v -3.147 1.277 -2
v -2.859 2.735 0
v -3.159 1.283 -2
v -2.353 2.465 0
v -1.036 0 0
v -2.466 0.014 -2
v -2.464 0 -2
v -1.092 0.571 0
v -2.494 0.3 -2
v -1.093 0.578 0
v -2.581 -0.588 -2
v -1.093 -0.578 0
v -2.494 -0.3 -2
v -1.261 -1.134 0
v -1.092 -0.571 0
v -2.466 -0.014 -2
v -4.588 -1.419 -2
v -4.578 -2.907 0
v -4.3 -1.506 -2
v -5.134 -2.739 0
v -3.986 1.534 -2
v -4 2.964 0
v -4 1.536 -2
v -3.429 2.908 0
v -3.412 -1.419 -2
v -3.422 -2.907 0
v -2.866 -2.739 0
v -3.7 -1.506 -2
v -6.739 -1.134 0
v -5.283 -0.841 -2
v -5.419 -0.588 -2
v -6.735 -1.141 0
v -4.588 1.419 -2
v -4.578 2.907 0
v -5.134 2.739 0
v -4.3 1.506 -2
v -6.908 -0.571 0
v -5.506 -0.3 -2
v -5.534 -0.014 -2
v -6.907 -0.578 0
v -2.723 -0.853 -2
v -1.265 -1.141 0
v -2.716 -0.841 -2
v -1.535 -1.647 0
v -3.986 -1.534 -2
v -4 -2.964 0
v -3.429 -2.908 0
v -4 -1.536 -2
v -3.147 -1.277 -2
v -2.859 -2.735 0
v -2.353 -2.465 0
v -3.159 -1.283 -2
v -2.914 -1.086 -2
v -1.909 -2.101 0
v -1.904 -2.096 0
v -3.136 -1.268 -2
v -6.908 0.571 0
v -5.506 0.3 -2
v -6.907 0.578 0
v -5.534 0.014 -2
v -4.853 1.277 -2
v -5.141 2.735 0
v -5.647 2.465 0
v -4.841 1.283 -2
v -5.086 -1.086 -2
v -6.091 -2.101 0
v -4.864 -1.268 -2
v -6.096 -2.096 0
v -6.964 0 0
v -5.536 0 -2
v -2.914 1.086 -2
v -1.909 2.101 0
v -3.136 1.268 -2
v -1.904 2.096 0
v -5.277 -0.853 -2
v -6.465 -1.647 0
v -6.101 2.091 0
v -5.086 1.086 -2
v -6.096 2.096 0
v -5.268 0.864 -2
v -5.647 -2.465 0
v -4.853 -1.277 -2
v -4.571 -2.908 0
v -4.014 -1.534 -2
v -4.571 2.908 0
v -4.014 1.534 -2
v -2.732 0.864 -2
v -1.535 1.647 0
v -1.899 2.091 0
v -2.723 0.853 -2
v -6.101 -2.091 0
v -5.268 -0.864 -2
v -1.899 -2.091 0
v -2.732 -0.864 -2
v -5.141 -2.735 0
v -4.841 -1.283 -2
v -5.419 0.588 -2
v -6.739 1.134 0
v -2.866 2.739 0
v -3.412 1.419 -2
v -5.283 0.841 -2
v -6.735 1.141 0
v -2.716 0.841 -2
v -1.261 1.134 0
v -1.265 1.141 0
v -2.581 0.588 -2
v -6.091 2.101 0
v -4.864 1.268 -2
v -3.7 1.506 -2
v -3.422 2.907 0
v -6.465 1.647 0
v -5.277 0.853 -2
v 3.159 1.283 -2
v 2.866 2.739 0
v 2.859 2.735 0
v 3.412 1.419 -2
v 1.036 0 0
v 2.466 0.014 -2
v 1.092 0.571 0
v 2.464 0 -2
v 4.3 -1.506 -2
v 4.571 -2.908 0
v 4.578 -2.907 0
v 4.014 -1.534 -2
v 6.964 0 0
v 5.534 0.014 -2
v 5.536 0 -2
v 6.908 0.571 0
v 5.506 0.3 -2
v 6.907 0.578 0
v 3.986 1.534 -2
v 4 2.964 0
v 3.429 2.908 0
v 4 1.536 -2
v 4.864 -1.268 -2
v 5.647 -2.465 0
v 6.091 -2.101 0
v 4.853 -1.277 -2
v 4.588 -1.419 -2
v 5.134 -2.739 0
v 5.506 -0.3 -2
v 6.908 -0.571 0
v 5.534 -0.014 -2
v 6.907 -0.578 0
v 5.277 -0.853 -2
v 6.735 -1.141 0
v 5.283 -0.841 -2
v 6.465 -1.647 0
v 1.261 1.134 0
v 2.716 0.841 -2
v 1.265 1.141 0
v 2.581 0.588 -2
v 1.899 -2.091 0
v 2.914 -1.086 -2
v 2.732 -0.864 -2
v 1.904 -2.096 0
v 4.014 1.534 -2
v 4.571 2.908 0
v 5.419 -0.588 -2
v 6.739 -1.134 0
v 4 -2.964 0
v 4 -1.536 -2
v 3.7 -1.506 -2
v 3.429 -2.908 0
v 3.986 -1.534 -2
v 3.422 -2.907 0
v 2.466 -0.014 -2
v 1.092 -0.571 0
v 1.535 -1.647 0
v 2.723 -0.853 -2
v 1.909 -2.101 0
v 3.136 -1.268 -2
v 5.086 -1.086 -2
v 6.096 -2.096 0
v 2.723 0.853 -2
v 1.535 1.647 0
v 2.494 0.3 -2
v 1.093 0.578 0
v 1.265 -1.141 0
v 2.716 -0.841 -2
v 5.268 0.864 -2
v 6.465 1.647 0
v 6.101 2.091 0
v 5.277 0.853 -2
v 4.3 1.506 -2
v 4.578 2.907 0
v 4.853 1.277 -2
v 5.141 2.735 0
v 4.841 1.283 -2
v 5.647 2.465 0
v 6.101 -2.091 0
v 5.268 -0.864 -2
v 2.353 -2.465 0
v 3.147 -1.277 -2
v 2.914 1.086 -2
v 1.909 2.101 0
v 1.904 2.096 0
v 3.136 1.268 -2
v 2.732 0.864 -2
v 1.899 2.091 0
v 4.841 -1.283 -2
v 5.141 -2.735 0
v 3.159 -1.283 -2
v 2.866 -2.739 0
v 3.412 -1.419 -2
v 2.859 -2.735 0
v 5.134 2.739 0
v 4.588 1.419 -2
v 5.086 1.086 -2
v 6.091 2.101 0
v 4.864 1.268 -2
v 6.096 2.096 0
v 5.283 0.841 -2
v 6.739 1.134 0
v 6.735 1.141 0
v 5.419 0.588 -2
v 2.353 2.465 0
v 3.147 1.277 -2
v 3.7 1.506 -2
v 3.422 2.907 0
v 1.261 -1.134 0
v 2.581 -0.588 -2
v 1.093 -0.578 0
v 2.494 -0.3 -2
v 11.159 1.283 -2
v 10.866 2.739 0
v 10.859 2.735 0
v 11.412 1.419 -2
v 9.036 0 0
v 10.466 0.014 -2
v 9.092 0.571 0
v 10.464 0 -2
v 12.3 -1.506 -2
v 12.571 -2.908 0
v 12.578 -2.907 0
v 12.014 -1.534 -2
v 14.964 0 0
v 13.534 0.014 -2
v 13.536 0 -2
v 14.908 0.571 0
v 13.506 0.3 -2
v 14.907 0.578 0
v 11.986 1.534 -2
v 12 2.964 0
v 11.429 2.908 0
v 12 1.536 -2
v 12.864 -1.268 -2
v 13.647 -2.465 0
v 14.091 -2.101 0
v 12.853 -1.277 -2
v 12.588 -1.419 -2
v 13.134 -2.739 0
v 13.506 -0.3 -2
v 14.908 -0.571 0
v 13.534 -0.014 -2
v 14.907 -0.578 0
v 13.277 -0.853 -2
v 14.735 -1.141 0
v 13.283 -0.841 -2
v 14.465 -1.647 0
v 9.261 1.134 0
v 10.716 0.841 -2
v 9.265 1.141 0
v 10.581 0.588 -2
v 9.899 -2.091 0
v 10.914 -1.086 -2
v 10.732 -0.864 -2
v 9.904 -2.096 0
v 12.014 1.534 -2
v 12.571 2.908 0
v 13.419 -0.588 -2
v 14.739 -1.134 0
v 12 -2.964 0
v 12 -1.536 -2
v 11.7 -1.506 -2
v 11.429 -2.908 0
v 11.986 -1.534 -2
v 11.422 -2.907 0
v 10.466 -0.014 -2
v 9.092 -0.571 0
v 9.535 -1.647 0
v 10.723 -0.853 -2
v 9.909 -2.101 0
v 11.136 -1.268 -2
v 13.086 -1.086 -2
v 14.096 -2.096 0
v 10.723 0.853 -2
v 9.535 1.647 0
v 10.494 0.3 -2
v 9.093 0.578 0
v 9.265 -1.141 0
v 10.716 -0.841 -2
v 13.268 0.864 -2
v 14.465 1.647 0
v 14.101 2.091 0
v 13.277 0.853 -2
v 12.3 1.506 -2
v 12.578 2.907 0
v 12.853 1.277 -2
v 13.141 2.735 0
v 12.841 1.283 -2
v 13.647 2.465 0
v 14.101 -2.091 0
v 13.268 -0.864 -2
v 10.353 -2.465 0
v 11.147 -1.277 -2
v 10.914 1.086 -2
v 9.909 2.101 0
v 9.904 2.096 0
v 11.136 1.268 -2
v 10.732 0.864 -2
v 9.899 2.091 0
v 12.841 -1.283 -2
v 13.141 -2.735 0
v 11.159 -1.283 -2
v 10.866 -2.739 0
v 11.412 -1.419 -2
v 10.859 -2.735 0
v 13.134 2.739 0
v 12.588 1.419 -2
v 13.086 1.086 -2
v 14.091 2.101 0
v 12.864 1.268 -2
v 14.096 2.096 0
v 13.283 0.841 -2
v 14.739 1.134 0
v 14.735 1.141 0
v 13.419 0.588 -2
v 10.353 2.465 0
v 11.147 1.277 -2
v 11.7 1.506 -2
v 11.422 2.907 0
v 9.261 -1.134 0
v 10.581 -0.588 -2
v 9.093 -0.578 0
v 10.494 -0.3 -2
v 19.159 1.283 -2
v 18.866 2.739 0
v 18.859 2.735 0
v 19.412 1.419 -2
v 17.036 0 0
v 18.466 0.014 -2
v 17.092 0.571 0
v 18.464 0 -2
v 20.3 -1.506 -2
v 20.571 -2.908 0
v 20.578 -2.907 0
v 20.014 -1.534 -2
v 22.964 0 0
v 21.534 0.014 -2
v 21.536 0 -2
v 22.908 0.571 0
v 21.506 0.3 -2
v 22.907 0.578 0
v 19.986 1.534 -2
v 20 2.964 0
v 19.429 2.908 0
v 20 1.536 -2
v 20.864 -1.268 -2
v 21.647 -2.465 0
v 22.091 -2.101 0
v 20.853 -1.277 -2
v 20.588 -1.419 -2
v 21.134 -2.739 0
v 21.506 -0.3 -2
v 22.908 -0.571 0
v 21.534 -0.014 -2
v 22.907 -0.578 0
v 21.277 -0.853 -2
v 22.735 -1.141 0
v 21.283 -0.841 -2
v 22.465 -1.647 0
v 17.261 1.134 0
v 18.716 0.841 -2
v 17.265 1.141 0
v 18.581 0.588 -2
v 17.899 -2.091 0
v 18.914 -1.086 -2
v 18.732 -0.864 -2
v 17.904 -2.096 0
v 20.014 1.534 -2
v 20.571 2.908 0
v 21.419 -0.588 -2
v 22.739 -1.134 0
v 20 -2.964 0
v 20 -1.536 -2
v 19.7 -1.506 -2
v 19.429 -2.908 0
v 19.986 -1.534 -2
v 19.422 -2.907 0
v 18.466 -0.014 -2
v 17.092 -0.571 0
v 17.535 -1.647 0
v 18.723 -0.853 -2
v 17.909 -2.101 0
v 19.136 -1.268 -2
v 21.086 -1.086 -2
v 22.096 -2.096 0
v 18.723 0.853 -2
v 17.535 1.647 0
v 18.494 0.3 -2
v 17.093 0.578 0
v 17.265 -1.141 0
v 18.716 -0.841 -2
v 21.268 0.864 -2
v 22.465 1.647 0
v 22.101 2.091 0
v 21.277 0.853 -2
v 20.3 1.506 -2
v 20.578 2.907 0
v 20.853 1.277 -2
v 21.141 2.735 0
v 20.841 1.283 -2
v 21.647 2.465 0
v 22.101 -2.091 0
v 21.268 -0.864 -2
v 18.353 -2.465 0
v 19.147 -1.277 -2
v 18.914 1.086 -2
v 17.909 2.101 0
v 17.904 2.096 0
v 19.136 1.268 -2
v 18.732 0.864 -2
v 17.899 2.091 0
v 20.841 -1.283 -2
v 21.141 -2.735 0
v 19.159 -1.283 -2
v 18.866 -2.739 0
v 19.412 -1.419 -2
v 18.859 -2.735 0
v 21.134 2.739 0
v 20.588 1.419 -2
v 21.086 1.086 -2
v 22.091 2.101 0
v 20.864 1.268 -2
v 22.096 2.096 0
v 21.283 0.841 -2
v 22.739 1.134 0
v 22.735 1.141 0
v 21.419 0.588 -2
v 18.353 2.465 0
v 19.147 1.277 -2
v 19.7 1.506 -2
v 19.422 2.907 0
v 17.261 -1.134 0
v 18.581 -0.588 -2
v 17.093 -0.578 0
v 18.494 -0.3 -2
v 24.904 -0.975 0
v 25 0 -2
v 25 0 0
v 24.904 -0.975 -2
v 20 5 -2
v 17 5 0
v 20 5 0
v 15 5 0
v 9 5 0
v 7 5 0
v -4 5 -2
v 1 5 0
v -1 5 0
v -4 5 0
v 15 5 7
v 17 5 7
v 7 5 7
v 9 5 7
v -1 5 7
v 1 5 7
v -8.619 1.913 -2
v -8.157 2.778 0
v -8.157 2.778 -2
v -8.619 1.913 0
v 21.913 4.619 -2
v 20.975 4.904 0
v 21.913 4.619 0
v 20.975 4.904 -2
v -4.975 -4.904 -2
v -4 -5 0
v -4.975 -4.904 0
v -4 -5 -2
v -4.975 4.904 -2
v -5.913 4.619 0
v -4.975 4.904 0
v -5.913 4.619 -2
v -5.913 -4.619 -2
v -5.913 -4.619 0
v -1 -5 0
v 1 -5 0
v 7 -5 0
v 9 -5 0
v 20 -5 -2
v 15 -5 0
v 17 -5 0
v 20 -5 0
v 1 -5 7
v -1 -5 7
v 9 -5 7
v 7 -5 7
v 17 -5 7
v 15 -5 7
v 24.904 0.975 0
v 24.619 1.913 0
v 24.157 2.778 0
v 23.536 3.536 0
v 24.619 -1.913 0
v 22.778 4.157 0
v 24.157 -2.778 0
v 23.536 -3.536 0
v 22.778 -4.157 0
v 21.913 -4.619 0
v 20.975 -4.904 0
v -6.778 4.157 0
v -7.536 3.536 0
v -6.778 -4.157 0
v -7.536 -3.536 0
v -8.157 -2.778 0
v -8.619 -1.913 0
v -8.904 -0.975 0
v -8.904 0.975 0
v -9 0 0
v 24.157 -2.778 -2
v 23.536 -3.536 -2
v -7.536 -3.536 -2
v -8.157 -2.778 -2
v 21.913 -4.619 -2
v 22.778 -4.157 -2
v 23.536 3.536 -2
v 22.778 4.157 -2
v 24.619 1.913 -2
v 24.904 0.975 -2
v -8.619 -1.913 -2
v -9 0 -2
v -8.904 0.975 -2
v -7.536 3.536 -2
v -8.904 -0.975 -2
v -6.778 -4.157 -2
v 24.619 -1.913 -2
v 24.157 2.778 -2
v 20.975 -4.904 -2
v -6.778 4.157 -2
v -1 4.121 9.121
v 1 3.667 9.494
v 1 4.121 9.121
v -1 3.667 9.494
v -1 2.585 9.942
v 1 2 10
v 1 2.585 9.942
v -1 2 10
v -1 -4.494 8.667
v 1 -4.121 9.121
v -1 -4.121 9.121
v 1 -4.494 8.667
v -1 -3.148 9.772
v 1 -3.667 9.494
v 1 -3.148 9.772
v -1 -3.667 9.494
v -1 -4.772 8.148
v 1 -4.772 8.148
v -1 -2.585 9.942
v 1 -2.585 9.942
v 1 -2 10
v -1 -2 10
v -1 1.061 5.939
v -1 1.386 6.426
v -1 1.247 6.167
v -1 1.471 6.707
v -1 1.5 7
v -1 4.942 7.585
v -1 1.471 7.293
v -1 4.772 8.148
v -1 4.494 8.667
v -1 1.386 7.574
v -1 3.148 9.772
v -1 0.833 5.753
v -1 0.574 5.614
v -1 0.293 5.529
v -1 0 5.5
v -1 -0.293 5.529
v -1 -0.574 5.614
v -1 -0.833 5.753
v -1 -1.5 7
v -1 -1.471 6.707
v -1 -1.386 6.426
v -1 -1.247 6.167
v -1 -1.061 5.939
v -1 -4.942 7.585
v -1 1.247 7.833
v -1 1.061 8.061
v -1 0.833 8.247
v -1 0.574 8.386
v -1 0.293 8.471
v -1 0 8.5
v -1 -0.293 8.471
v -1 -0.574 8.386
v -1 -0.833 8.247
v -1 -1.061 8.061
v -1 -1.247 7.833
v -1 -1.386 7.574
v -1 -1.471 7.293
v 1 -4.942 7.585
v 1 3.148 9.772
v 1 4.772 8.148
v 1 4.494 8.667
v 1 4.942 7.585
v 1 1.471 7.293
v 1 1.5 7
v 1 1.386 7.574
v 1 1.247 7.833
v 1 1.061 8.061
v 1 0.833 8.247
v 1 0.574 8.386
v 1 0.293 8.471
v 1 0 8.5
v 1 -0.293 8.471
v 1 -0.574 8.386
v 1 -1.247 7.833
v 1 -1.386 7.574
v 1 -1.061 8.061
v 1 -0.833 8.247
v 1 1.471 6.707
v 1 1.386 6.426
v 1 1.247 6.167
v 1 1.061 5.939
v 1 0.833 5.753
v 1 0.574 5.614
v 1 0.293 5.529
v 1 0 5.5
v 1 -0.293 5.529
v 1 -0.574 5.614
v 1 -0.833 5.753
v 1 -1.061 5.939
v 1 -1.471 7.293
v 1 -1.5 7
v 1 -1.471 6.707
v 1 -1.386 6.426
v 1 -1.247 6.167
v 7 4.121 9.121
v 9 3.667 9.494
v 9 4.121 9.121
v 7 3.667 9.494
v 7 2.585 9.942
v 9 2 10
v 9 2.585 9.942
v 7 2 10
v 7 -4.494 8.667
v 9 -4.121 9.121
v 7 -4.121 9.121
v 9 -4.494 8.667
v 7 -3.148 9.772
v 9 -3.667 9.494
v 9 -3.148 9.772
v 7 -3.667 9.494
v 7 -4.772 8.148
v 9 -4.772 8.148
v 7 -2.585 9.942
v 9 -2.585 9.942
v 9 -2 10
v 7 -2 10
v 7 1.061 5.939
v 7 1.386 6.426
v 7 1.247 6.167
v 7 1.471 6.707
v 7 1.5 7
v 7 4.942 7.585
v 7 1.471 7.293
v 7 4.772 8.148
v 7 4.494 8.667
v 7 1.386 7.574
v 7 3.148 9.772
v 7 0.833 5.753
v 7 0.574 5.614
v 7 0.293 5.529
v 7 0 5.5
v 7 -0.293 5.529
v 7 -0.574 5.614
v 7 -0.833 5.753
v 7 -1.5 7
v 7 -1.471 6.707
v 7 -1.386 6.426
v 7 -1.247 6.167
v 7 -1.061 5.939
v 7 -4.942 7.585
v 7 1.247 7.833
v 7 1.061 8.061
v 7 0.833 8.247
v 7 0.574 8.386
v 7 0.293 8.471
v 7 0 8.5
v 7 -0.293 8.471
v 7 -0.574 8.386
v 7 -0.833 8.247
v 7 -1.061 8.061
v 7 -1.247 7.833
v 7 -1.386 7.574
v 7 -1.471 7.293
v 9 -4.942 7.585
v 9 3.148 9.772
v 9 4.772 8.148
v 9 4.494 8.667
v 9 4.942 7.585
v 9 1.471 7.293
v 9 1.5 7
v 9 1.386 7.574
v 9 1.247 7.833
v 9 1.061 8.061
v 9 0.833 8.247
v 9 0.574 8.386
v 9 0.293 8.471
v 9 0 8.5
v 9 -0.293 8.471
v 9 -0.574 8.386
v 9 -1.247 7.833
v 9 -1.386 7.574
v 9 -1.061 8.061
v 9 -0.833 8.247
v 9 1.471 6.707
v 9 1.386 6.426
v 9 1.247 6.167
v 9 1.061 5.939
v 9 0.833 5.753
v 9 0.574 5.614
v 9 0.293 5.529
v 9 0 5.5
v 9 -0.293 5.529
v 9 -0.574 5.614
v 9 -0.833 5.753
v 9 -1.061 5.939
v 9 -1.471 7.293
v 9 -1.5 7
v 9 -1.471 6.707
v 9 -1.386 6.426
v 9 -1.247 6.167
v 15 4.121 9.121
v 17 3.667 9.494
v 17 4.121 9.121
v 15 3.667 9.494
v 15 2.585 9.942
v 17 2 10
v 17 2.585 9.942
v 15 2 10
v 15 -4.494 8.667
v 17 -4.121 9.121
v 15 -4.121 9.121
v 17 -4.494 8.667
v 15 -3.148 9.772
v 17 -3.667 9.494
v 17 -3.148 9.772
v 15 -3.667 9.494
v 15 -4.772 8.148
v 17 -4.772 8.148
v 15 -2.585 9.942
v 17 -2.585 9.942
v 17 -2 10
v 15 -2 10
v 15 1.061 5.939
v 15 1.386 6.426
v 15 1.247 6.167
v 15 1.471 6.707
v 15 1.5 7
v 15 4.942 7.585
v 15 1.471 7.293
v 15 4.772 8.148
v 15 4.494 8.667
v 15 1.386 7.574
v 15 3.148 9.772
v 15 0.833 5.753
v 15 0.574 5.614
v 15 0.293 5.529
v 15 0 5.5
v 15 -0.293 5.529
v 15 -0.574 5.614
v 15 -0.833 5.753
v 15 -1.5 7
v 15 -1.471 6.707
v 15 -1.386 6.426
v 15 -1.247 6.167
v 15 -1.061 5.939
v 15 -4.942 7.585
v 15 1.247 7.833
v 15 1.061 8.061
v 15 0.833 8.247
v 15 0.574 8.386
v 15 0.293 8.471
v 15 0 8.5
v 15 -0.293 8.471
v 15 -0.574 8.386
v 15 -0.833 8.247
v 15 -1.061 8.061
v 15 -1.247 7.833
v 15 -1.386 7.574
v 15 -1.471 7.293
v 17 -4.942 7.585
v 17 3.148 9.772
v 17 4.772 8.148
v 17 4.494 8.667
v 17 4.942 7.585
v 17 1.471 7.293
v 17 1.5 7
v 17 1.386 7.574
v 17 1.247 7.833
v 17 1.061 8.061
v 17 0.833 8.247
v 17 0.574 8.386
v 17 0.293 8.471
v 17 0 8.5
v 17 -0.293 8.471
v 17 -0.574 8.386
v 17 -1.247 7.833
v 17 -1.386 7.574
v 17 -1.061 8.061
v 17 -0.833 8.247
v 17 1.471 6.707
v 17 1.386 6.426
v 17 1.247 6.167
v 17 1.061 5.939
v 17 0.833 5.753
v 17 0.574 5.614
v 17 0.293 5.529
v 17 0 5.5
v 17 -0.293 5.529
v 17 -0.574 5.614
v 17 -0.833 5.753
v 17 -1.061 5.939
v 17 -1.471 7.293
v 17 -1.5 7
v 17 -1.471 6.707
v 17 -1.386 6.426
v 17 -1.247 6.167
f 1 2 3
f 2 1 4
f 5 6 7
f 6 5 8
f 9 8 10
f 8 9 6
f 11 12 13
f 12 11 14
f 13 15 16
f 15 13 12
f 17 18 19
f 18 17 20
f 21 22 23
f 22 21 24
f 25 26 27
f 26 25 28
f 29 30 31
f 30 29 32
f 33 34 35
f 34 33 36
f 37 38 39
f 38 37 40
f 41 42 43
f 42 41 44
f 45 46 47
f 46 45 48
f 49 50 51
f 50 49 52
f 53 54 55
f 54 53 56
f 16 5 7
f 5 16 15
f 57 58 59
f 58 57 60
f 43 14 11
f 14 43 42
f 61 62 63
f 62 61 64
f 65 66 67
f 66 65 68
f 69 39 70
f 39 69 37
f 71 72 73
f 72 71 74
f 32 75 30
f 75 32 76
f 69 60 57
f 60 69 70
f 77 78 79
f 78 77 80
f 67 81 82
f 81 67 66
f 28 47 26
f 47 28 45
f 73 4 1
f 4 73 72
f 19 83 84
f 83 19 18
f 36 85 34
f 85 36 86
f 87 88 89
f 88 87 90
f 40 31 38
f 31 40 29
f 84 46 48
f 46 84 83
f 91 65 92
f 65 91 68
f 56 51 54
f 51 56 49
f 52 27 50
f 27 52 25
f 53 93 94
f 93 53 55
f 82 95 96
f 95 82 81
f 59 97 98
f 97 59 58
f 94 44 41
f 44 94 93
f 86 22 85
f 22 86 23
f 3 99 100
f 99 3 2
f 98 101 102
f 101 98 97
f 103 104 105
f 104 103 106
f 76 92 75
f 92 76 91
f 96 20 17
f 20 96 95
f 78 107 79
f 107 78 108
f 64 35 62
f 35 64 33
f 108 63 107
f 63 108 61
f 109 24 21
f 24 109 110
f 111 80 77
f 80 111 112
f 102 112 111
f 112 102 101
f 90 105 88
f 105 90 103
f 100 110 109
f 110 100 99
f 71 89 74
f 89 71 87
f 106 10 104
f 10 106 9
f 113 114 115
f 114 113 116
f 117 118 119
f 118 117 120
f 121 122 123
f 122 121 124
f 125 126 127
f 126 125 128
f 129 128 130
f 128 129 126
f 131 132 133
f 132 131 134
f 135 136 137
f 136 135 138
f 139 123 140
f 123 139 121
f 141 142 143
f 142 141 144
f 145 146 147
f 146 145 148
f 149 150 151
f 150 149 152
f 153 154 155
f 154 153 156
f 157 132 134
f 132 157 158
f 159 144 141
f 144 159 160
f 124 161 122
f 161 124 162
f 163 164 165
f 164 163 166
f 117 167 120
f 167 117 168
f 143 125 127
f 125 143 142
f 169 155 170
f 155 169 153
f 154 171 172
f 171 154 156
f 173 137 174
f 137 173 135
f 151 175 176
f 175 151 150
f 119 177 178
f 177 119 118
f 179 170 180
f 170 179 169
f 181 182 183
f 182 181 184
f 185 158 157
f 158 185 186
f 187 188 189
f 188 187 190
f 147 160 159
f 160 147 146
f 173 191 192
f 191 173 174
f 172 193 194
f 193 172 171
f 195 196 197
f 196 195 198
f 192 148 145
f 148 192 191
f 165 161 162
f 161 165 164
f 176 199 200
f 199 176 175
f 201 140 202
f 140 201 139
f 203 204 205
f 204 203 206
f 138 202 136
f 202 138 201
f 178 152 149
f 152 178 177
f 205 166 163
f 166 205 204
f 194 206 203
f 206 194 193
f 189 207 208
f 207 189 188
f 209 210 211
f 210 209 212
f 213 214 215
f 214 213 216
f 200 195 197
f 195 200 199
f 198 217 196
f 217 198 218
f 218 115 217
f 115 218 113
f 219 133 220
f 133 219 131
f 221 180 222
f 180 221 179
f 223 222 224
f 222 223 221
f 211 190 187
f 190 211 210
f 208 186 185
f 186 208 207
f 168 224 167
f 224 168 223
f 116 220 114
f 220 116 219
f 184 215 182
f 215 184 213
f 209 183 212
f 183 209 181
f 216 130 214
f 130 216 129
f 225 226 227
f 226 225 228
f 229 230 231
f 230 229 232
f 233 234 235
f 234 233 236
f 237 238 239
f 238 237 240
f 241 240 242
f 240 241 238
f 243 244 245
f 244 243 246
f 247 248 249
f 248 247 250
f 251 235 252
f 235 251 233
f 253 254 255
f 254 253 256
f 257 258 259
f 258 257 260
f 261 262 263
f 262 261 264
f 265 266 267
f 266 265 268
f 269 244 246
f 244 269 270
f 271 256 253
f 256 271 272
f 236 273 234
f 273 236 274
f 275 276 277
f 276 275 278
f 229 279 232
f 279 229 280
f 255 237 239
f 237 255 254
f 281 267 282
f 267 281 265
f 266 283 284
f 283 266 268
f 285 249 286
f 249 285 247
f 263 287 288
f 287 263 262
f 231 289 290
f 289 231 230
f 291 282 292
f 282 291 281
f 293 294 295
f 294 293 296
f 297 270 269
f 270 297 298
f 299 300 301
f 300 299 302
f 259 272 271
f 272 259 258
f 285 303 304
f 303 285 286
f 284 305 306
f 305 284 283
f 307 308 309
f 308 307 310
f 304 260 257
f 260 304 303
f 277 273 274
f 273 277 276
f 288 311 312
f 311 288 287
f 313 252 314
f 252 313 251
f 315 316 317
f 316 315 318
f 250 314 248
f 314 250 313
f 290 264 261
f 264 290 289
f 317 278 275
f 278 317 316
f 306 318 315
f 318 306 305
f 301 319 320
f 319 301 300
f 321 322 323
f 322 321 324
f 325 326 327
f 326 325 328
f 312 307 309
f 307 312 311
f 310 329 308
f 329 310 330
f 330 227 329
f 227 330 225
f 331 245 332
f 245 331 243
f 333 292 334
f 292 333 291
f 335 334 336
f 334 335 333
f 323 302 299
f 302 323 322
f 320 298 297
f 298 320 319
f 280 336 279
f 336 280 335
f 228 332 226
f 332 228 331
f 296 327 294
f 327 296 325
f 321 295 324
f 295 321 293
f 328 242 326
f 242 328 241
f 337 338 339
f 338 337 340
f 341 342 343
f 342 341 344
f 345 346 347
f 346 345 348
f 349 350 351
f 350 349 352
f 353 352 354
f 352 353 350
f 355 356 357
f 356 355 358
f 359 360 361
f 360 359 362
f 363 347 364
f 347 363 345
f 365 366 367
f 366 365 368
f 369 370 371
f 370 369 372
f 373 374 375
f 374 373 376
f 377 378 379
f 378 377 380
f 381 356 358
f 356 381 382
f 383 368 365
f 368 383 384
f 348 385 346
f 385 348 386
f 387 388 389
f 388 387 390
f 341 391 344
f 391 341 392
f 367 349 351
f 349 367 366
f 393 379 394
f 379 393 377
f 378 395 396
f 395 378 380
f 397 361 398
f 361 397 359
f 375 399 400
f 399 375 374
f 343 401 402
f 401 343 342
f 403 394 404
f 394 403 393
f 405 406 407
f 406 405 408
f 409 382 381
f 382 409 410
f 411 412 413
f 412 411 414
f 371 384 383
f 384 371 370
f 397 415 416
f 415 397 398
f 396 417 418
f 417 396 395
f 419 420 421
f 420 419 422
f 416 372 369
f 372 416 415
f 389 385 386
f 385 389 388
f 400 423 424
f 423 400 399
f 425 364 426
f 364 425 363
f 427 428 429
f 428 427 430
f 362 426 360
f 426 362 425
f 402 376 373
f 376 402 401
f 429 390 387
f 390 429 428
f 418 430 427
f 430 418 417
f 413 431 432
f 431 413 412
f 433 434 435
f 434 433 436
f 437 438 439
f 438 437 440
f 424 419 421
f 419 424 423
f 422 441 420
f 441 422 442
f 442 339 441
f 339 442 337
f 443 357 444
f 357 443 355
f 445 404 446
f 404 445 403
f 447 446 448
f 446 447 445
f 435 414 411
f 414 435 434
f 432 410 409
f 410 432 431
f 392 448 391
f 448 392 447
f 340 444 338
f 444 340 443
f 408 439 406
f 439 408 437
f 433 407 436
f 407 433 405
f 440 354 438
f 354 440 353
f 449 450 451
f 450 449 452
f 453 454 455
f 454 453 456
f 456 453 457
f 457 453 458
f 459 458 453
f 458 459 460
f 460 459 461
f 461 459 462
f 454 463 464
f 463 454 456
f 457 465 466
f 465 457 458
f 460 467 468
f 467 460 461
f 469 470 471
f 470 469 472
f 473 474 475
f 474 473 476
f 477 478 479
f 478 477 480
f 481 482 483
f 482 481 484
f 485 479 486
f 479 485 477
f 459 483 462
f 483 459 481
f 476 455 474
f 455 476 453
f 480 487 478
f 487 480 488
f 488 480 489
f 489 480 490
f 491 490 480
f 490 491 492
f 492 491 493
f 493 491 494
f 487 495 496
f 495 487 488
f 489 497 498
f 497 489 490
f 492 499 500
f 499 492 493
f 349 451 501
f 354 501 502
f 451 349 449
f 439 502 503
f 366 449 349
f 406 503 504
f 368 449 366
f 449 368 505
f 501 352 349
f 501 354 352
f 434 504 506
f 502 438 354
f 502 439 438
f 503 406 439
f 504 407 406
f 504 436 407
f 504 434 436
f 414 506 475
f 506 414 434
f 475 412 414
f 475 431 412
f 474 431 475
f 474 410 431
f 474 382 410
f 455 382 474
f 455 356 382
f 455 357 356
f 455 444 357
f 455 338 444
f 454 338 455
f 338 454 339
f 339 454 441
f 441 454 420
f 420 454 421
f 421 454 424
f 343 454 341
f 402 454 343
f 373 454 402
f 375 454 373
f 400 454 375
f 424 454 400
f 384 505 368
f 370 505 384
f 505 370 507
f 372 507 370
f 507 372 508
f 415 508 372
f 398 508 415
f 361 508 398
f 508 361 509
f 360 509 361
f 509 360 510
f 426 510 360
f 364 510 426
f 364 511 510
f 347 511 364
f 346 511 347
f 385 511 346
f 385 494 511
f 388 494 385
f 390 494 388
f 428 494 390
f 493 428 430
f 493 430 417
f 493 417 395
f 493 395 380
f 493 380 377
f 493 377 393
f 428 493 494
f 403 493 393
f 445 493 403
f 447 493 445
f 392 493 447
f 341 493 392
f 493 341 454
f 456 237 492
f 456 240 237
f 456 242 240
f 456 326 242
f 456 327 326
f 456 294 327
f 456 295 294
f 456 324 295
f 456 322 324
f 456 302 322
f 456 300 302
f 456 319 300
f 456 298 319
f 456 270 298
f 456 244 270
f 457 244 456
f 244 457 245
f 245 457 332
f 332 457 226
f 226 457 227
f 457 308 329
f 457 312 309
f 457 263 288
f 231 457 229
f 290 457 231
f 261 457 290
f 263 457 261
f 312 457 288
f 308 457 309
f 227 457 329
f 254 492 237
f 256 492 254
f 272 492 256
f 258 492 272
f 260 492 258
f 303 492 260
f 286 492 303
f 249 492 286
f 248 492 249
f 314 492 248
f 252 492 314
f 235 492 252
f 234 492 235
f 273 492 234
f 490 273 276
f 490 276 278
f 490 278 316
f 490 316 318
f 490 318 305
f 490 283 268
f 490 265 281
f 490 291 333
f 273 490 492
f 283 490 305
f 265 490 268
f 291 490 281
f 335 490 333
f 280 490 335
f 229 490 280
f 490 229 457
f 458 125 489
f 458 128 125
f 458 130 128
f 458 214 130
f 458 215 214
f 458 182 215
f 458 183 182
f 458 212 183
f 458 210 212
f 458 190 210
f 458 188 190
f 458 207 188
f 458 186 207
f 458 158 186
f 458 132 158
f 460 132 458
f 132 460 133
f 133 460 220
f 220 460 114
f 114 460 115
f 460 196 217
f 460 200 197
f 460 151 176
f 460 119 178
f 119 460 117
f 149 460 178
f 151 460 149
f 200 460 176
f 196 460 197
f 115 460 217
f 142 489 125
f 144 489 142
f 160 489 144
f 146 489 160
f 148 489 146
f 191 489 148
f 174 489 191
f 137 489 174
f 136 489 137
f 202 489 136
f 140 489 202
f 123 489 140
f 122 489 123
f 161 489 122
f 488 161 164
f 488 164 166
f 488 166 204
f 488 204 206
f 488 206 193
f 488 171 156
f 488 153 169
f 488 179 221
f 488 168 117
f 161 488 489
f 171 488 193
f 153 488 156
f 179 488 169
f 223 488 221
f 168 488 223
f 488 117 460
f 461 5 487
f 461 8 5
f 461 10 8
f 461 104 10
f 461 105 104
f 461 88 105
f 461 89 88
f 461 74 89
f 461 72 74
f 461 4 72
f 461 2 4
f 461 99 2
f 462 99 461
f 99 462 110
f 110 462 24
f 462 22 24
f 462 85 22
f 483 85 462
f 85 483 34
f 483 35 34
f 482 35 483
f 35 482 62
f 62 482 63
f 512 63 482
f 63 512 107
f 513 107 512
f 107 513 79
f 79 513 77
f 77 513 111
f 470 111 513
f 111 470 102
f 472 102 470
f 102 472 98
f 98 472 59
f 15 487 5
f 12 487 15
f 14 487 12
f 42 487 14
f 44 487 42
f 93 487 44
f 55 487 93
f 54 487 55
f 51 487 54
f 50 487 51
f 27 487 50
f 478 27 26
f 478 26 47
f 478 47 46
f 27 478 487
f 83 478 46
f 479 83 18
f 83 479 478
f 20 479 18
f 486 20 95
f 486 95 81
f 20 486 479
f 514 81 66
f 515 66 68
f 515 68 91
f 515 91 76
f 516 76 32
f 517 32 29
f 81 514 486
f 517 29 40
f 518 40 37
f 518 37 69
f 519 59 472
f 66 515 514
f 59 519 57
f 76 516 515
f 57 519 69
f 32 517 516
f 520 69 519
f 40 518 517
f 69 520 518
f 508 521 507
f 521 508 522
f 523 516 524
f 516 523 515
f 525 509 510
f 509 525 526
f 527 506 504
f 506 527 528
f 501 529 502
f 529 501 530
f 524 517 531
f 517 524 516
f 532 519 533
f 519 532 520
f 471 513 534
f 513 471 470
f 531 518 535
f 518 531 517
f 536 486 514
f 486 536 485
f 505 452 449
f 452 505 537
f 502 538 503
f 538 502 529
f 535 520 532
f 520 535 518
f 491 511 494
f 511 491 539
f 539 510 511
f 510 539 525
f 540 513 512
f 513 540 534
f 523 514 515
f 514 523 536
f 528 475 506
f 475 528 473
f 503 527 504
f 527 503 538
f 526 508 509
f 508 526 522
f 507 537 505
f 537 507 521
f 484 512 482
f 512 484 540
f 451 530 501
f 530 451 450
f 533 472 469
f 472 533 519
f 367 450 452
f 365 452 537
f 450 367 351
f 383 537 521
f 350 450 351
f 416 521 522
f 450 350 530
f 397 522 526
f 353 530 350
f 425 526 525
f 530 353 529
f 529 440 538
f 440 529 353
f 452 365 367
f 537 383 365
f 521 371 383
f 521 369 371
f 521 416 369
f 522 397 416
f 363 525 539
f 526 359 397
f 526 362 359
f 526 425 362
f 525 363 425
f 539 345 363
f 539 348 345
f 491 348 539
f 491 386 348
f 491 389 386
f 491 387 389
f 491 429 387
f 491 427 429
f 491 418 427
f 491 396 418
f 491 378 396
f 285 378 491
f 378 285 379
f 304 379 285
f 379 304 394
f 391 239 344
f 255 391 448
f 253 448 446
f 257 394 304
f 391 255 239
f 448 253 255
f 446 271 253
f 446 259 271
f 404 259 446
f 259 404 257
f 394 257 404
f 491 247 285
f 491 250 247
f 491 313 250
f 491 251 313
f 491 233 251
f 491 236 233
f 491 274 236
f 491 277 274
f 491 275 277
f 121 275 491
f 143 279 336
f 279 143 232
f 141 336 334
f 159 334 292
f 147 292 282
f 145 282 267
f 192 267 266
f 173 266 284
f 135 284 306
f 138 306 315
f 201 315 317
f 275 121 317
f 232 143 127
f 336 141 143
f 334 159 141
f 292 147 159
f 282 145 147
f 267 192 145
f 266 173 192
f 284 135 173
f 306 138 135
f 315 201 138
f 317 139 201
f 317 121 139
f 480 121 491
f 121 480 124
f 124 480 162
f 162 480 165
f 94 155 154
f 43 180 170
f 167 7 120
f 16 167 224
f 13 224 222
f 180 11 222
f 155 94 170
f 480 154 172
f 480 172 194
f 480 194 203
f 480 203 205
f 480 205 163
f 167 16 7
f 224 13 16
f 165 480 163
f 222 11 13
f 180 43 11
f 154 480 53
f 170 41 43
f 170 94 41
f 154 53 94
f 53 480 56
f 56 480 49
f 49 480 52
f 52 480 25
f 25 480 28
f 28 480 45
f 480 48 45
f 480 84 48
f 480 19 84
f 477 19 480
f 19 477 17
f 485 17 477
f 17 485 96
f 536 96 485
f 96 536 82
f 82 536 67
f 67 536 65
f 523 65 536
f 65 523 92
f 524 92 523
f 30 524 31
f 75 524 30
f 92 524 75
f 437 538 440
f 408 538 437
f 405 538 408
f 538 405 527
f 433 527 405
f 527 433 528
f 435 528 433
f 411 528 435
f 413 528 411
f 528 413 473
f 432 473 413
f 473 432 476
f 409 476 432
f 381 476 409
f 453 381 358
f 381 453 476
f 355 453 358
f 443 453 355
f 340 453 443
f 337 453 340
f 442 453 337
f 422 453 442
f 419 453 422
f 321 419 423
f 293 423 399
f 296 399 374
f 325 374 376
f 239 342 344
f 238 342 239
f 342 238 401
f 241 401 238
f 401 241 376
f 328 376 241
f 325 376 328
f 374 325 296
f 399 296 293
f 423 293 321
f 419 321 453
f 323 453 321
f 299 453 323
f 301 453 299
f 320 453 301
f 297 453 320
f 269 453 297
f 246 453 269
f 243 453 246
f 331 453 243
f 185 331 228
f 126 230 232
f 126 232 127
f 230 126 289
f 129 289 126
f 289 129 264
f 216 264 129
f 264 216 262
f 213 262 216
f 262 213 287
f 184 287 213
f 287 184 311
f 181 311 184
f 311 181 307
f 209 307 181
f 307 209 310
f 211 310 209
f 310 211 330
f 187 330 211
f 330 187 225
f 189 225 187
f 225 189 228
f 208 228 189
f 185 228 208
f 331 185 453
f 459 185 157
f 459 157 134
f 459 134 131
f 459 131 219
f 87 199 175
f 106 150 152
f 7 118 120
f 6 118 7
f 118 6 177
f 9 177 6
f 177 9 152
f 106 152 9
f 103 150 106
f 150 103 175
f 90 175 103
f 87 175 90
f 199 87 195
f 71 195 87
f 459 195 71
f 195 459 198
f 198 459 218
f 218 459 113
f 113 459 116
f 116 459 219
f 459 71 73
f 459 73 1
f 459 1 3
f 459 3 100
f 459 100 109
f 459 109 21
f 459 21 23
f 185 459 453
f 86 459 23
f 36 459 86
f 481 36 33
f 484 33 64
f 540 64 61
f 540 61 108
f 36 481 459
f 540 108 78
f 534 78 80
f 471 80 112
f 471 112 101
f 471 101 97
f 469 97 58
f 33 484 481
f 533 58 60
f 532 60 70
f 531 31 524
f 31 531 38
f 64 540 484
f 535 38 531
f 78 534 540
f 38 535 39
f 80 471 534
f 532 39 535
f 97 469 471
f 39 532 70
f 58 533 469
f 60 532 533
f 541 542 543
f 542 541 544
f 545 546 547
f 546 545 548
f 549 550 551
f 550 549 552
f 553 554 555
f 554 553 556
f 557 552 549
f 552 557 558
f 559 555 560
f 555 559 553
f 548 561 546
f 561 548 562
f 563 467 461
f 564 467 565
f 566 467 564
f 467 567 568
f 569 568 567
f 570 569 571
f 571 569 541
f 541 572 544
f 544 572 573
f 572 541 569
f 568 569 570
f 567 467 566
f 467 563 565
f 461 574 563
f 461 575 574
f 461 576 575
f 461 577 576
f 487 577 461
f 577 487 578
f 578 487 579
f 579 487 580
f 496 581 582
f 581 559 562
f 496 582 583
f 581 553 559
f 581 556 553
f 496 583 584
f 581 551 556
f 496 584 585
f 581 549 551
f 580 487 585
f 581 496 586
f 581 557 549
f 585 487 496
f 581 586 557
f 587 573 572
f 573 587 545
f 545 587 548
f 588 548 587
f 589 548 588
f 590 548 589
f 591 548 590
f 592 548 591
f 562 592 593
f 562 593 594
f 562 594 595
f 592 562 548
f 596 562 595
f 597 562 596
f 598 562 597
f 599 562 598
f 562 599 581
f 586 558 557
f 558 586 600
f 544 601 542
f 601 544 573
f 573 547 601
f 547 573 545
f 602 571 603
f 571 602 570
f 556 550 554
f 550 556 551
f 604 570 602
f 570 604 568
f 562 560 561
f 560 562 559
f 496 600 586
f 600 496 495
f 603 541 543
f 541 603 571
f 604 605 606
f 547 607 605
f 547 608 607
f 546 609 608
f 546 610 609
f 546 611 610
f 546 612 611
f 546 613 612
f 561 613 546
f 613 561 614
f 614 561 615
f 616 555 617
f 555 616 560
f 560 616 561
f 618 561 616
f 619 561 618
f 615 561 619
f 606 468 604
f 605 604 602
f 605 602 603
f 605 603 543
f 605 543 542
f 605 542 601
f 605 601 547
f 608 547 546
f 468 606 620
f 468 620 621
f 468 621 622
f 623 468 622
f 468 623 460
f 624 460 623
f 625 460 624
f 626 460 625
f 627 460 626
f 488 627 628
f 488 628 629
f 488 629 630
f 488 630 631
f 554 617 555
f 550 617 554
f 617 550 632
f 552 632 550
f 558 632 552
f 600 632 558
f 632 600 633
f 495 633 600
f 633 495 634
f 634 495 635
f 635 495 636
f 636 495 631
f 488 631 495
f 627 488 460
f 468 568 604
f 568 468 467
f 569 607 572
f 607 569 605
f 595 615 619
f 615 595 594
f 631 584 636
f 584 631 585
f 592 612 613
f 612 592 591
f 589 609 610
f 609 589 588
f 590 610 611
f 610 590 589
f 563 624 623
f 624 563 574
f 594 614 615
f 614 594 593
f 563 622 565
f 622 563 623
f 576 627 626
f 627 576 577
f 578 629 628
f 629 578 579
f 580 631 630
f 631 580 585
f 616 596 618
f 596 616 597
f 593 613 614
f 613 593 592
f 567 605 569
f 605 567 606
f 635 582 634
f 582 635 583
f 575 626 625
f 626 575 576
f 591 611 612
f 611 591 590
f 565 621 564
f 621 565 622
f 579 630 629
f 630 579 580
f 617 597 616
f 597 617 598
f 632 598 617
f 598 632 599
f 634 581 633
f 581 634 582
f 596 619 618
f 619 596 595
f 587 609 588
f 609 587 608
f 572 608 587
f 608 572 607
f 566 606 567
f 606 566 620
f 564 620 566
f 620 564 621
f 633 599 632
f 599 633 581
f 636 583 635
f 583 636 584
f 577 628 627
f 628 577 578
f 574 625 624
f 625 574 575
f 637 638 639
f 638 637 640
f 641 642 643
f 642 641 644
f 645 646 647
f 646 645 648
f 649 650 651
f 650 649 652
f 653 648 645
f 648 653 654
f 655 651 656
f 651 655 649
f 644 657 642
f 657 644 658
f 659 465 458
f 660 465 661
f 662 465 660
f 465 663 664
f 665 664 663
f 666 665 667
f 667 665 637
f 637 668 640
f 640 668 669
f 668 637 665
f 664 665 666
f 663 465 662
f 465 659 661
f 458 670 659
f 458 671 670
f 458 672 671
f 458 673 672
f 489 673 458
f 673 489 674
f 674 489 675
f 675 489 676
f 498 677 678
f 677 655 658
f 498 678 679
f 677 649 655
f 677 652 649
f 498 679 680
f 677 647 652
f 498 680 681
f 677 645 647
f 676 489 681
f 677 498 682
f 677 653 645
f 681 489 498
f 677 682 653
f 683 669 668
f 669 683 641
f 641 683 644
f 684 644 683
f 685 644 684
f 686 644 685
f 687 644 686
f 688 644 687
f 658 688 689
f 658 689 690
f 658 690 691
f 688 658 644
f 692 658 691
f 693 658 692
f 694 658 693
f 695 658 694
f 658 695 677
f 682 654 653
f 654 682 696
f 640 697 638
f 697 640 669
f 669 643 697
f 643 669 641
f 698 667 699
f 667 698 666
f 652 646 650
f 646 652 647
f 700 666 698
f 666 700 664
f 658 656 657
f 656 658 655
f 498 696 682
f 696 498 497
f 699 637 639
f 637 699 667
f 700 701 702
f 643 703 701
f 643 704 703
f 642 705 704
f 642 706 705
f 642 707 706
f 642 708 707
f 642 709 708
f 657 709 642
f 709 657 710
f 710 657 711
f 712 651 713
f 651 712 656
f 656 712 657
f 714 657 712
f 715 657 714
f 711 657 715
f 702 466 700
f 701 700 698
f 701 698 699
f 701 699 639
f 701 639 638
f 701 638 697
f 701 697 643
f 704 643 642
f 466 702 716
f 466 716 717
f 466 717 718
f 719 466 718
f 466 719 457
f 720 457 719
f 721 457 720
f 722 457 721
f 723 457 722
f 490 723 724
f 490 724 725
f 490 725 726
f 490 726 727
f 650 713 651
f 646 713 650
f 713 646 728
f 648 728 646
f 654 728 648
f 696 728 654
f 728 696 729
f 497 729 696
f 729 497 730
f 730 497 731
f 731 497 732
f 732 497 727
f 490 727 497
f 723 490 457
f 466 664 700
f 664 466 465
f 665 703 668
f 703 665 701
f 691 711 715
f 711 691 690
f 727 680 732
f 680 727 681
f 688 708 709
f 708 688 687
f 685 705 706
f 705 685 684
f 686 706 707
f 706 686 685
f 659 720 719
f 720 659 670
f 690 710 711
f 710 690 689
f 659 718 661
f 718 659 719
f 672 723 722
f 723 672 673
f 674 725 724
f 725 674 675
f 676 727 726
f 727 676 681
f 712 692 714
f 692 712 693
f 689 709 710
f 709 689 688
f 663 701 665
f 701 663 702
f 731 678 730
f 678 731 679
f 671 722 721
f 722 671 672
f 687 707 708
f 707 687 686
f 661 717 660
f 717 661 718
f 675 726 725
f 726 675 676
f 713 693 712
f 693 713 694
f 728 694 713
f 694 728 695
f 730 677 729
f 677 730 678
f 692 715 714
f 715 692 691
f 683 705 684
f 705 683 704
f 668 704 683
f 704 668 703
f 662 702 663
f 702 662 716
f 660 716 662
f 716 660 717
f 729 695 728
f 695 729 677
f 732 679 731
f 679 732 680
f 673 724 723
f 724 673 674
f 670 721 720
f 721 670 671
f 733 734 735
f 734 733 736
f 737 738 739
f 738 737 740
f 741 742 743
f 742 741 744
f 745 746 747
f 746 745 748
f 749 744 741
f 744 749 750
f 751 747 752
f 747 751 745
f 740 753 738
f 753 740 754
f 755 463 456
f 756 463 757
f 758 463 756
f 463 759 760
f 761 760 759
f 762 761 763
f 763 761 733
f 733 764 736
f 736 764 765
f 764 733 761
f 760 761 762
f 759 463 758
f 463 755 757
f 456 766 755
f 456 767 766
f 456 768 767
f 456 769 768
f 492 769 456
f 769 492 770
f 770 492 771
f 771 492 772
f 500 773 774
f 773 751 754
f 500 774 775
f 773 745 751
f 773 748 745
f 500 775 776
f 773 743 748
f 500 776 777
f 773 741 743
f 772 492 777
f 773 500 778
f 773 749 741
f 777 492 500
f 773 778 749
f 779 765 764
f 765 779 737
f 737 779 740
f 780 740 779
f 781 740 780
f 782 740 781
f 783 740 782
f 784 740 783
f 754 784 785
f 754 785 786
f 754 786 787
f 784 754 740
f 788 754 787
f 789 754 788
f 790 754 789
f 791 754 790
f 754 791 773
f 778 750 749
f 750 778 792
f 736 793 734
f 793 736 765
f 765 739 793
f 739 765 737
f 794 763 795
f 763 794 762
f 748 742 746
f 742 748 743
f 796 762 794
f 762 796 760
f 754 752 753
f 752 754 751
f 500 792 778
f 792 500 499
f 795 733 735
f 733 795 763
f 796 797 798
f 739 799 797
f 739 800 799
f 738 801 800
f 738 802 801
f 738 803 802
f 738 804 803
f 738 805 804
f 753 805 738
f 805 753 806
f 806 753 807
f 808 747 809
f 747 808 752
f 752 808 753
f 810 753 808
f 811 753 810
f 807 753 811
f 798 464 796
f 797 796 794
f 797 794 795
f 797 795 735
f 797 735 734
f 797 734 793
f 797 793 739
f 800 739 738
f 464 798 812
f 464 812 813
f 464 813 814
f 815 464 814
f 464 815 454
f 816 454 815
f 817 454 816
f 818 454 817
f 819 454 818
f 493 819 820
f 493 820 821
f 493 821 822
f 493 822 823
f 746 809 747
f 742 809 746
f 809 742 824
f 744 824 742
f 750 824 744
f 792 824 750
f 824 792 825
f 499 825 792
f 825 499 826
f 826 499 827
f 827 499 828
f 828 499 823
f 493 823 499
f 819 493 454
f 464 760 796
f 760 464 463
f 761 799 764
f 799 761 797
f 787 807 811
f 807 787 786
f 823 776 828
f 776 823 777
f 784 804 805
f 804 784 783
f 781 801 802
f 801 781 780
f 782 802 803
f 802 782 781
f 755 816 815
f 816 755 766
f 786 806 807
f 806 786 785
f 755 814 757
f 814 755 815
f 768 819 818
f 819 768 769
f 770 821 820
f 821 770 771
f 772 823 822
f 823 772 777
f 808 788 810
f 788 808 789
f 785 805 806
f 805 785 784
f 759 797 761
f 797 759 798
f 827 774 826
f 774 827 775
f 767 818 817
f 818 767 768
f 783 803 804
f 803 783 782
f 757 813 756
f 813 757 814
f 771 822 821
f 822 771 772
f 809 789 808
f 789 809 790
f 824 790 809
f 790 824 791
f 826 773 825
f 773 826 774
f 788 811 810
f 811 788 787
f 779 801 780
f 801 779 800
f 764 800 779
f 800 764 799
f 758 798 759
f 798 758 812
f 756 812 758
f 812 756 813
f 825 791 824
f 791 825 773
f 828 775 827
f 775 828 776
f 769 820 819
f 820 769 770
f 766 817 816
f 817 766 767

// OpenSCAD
$fn=32*1;

// Number of spots for cables
num_slots = 2; // [1:20]

// Gap for each cable (mm)
slot_width = 6;

// Thickness of walls separating cables (mm)
wall_thickness = 2;

// How far out the walls stick out from the base (mm)
wall_depth = 10;

// Height of the assembly (mm)
height = 10;

// Thickness of the back plate (mm)
back_thickness = 2;

// Diameter of the mounting holes in the back plate (mm). A value of 3mm is appropriate for #4 wood screws.
back_hole_dia = 3;

// Diameter of the holes in the walls for ziptie, bolt+nut, etc. (mm)
slot_hole_dia = 3;

// Radius of the rounding of the walls (mm)
wall_corner_radius=3;

// Countersink the holes for wood screws to sit flush?
back_wood_screws = 1; // [1:Yes, 0:No]

// For wood screws, how many times bigger is the head than the shaft?
wood_screw_head_ratio = 2;

difference() {
    translate([0,0,-back_thickness]) hull() {
        x0 = -wall_thickness/2-slot_width/2;
        x1 = num_slots*(slot_width+wall_thickness)+wall_thickness/2+slot_width/2;
        translate([x0,0]) cylinder(d=height, h=back_thickness);
        translate([x1,0]) cylinder(d=height, h=back_thickness);
    }
    for (s = [-1:num_slots-1+1]) {
        x = (slot_width+wall_thickness)*s+wall_thickness/2+slot_width/2;
        if (back_wood_screws) {
            translate([x,0,-back_thickness/2]) cylinder(d1=back_hole_dia, d2=back_hole_dia*wood_screw_head_ratio ,h=back_thickness+0.1,center=true);
        } else {
            translate([x,0,0]) cylinder(d=back_hole_dia ,h=20,center=true);
        }
            
    }
}

for (s = [0:num_slots]) {
    x = (slot_width+wall_thickness)*s;
    translate([x,0,0]) difference() {
        hull() {
            translate([-wall_thickness/2,-height/2]) cube([wall_thickness,height,0.1]);
            y = height/2-wall_corner_radius;
            z = wall_depth-wall_corner_radius;
            for (m = [0,1]) mirror([0,m]) 
                translate([0,y,z]) rotate([0,90]) cylinder(r=wall_corner_radius,h=wall_thickness,center=true);
        }
        translate([0,0,wall_depth-slot_hole_dia]) rotate([0,-90]) cylinder(d=slot_hole_dia,h=20,center=true);
    }
}
